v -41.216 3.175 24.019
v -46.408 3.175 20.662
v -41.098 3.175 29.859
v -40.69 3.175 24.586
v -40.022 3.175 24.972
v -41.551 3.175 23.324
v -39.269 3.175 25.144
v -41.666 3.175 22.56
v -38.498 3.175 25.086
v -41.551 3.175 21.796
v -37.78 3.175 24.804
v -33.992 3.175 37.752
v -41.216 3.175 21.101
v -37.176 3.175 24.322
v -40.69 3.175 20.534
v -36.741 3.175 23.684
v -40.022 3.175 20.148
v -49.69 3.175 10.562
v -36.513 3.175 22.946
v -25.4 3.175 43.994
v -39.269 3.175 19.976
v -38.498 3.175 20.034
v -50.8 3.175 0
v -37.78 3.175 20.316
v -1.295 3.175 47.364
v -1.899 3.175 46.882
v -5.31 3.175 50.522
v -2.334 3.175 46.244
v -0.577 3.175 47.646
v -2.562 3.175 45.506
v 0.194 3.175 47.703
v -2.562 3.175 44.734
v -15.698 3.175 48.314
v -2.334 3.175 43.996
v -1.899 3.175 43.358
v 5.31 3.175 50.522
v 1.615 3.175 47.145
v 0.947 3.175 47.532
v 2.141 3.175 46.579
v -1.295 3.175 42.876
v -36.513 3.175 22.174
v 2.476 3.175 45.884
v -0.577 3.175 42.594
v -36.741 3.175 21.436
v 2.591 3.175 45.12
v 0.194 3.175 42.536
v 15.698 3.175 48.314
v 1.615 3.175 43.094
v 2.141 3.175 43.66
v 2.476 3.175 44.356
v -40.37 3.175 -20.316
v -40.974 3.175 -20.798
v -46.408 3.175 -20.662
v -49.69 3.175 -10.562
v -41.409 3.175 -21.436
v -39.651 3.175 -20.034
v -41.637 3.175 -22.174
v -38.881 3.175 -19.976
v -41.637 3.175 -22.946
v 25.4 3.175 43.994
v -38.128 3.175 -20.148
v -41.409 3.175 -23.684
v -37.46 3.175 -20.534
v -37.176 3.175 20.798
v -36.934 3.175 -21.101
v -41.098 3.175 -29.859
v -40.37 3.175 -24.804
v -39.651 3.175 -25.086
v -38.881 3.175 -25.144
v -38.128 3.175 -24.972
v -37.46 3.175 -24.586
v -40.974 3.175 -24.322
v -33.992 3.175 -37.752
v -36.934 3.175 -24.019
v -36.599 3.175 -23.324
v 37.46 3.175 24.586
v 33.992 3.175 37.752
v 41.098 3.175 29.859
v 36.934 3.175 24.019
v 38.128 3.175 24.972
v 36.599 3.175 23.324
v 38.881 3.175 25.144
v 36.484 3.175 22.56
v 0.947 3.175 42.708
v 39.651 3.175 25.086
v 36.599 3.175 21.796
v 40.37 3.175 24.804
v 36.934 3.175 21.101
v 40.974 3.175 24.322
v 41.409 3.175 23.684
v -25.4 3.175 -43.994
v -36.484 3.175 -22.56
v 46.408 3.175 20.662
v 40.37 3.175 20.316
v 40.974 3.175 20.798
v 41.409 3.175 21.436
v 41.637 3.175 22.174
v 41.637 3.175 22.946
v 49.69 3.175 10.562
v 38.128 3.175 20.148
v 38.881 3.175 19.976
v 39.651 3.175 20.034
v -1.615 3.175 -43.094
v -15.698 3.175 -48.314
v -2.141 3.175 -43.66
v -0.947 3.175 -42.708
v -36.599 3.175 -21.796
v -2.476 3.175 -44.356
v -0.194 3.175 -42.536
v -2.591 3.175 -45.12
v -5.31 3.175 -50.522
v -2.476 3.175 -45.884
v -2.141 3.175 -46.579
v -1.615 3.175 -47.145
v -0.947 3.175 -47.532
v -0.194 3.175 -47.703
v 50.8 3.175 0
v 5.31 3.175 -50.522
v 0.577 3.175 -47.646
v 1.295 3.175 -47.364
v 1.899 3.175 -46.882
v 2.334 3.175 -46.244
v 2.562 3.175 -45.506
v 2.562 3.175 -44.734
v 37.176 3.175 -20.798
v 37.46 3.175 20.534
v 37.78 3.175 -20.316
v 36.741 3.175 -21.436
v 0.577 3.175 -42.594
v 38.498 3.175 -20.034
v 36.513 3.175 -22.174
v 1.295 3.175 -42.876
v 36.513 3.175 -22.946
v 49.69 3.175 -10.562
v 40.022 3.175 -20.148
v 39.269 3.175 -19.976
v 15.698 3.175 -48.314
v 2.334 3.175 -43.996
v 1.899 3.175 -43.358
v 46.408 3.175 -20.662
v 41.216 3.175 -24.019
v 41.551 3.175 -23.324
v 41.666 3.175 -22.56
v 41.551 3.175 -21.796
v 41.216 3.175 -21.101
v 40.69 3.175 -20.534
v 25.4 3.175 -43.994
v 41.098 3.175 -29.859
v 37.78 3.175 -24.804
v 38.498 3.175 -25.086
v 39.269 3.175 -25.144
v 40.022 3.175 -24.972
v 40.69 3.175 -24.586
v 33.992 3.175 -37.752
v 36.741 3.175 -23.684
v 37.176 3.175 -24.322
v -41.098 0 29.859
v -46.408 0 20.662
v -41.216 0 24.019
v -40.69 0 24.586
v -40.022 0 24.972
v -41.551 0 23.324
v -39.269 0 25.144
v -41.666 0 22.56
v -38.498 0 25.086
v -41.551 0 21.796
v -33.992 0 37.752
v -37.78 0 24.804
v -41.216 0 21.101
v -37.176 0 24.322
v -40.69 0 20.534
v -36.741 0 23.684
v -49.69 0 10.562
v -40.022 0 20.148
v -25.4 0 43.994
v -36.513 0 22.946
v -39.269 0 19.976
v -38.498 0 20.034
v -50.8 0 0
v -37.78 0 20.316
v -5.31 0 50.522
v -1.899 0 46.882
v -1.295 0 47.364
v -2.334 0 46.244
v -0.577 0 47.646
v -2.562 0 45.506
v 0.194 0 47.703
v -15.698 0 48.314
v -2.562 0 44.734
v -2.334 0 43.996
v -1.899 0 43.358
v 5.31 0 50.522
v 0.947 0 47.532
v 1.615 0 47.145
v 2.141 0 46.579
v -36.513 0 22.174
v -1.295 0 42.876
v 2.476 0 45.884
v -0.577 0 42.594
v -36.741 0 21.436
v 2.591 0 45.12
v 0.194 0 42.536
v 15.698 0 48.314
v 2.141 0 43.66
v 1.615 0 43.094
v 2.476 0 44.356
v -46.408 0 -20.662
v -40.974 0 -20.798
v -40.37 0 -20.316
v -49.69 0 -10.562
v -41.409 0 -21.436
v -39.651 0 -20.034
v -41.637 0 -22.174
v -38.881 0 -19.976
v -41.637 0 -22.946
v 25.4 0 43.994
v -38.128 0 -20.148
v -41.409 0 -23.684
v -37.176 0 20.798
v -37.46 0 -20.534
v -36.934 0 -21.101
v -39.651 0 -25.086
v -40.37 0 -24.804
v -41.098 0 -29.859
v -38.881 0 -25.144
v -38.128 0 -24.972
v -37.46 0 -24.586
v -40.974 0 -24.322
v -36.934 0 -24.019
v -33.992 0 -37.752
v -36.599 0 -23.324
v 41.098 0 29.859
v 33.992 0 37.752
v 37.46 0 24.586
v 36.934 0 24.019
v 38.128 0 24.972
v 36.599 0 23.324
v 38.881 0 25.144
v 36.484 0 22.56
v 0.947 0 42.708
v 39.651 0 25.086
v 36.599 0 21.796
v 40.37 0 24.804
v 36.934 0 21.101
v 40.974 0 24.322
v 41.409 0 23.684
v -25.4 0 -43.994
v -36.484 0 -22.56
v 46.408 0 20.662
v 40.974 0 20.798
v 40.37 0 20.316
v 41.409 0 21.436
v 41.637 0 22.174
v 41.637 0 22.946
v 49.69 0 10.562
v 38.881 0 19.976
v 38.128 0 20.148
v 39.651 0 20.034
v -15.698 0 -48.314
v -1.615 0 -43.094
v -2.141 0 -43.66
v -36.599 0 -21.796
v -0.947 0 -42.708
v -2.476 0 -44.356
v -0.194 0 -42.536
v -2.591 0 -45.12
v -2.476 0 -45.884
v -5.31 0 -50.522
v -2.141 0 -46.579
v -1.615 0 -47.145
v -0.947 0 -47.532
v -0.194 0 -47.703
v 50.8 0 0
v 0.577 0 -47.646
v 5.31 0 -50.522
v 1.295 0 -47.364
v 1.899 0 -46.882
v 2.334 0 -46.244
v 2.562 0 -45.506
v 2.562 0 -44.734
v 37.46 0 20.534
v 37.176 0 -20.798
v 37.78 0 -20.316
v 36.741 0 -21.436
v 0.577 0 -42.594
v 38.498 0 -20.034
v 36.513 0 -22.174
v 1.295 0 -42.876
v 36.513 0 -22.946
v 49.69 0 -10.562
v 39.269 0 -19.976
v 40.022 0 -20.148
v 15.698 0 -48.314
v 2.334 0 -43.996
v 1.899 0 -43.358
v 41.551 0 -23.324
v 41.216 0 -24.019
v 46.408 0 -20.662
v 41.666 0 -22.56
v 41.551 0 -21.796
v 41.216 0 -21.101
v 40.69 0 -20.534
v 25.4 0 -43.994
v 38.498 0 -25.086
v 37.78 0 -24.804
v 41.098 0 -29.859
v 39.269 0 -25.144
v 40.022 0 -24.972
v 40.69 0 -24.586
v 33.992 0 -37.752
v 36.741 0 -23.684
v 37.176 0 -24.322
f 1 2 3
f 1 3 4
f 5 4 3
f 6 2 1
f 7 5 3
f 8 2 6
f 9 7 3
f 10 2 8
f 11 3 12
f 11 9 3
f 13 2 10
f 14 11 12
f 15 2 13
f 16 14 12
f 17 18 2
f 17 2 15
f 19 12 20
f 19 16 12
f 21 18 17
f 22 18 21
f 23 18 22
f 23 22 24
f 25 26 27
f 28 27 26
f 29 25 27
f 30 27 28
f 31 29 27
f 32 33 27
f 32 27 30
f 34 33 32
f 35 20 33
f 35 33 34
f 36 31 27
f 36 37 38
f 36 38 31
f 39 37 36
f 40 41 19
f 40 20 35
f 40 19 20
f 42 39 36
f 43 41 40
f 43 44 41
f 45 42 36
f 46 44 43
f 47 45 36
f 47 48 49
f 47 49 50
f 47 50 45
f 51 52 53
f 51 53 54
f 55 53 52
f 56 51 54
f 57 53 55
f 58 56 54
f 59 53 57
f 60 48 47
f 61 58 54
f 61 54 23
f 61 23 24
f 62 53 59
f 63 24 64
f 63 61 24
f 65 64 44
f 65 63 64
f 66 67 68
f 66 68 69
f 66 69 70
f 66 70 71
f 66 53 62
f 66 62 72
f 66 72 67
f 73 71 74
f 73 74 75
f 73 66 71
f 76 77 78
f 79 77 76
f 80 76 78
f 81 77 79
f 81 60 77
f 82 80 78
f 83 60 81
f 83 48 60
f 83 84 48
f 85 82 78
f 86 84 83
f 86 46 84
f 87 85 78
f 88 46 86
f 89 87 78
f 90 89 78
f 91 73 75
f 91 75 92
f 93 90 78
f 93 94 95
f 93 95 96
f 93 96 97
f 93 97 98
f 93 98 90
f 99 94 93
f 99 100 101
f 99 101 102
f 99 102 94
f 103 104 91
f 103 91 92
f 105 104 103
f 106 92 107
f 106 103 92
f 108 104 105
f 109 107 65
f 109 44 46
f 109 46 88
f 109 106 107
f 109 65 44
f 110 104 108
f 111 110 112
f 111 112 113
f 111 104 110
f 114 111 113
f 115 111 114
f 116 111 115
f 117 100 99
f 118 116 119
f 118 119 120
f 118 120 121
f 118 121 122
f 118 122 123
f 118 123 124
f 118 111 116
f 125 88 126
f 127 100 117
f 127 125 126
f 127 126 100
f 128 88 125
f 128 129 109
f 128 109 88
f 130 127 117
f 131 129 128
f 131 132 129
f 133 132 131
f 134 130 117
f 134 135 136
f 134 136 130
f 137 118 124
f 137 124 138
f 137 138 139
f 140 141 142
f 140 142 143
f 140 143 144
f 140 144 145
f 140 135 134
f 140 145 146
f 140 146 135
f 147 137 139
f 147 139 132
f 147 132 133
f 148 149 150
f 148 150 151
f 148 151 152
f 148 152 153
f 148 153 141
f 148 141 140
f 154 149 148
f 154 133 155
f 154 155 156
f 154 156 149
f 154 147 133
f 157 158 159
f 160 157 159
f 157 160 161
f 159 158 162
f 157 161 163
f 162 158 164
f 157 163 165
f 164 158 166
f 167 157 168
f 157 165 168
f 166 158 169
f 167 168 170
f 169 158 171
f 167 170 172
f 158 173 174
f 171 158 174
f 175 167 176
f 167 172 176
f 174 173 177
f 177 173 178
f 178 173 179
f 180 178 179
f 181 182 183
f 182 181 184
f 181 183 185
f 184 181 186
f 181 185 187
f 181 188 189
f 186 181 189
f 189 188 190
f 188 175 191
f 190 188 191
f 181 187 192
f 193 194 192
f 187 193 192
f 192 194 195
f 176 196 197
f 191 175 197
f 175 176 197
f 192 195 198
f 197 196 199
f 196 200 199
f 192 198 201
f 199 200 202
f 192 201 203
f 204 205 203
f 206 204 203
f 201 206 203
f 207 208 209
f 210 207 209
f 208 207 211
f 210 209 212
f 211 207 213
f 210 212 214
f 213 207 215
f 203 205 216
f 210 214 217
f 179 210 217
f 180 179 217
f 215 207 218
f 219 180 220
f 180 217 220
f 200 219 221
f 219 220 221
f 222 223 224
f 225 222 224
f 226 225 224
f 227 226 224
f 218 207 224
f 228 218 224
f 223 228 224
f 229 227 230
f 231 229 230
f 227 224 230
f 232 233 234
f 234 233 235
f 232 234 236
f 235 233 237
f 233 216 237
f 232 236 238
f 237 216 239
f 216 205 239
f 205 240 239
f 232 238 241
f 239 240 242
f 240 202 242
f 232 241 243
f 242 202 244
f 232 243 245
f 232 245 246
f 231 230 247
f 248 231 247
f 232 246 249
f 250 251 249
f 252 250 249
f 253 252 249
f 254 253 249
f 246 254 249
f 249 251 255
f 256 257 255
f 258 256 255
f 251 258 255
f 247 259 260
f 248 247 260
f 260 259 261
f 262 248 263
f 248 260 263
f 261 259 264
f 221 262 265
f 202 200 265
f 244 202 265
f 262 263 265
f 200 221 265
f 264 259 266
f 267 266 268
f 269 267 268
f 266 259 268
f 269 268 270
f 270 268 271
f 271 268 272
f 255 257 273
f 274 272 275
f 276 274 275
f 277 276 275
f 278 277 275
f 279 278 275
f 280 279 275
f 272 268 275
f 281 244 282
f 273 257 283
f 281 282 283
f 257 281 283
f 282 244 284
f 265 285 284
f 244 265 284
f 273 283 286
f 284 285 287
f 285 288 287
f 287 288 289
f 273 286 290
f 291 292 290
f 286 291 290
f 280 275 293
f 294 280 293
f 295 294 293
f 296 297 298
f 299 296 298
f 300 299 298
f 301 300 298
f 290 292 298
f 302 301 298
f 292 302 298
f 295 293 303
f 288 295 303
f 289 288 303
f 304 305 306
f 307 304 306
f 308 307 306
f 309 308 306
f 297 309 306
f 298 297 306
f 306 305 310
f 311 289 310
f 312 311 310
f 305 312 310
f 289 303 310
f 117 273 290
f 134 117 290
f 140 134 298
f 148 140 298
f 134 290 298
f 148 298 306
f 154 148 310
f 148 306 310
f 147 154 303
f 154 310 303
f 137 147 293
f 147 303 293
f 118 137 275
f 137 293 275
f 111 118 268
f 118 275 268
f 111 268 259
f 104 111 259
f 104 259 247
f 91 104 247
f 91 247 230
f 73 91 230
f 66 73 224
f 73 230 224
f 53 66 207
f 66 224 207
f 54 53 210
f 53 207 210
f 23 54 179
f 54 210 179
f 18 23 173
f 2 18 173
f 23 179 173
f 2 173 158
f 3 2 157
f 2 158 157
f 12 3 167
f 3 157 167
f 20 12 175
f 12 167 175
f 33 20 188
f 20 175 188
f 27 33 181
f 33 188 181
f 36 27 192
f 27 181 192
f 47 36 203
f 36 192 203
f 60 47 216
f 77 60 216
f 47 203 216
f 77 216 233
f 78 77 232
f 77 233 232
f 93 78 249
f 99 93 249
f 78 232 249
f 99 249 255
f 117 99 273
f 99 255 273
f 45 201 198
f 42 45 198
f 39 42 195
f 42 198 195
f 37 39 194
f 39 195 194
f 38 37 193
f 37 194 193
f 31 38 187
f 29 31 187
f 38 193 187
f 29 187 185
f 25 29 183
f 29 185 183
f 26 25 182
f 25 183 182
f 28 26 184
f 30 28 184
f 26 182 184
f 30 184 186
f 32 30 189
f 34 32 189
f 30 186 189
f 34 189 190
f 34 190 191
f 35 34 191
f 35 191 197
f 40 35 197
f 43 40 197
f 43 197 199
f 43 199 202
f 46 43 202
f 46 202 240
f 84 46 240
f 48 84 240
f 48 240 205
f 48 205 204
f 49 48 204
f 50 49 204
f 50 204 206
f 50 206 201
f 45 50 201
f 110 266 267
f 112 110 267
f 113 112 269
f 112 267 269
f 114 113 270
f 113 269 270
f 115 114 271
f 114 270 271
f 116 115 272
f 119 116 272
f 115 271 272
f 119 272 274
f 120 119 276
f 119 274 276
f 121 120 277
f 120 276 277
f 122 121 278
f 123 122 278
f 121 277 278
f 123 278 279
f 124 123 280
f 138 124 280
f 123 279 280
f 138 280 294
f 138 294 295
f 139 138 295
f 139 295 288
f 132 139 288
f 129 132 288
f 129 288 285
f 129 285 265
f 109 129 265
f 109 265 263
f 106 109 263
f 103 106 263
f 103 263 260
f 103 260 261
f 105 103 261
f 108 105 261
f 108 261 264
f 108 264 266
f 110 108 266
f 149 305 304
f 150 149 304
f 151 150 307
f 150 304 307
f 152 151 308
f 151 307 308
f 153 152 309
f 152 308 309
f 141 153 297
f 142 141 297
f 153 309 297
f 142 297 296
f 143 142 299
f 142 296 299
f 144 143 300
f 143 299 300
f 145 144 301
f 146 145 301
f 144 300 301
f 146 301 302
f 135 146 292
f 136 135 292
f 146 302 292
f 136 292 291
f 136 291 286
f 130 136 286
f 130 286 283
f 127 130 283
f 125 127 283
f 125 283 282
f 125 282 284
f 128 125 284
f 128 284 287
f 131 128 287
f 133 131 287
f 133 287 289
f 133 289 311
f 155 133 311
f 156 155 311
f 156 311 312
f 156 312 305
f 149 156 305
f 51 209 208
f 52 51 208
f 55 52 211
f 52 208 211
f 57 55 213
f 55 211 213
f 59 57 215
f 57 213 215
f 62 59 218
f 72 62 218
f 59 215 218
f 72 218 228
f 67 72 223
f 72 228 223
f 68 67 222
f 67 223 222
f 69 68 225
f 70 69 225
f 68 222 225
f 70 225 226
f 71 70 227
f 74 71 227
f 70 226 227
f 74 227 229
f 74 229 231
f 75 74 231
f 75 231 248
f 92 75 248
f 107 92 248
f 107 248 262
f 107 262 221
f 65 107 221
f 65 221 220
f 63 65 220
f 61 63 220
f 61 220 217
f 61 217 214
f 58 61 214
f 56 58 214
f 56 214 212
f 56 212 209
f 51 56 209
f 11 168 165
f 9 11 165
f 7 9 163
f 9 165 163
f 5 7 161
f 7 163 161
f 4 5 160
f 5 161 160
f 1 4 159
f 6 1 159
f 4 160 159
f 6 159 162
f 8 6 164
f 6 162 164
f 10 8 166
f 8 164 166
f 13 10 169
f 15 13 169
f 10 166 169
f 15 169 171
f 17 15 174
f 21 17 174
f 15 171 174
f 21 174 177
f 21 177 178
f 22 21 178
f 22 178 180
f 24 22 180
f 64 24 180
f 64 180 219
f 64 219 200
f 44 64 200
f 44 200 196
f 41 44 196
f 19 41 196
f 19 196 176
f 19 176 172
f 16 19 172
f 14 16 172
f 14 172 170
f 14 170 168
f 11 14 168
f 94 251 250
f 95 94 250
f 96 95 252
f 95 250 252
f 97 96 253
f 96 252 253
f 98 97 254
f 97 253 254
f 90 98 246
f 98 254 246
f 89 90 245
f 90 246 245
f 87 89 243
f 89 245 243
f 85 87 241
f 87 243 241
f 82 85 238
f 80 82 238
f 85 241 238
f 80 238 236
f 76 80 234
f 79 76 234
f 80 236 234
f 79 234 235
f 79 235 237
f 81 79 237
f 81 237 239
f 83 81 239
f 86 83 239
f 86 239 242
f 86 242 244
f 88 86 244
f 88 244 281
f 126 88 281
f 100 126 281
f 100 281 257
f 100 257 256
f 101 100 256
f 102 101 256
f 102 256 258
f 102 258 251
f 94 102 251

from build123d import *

# Parameters (mm, degrees)
SKETCH1_R                  = 50.8
BOSS_EXTRUDE1_DEPTH        = 3.175
F_6_0_204_DIAMETER_HOLE1_D = 5.1816
CIRPATTERN1_COUNT          = 6


with BuildPart() as part:
    # Sketch1 → Boss-Extrude1 (new body)
    with BuildSketch(Plane(origin=(0, 0, 0), x_dir=(1, 0, 0), z_dir=(0, 1, 0))):
        Circle(SKETCH1_R)
    extrude(amount=BOSS_EXTRUDE1_DEPTH)

    # #6 (0.204) Diameter Hole1 (through all)
    with Locations(Plane(origin=(0, 3.175, 0), x_dir=(1, 0, 0), z_dir=(0, 1, 0))):
        with Locations((0, 45.119902577)):
            f_6_0_204_diameter_hole1 = Hole(F_6_0_204_DIAMETER_HOLE1_D / 2)

    # CirPattern1: #6 (0.204) Diameter Hole1 ×6 about axis
    cirpattern1_axis = Axis((0, 0, 0), (0, 1, 0))
    for i in range(1, CIRPATTERN1_COUNT):
        add(f_6_0_204_diameter_hole1.rotate(cirpattern1_axis, i * 360 / CIRPATTERN1_COUNT), mode=Mode.SUBTRACT)


solid = part.part
